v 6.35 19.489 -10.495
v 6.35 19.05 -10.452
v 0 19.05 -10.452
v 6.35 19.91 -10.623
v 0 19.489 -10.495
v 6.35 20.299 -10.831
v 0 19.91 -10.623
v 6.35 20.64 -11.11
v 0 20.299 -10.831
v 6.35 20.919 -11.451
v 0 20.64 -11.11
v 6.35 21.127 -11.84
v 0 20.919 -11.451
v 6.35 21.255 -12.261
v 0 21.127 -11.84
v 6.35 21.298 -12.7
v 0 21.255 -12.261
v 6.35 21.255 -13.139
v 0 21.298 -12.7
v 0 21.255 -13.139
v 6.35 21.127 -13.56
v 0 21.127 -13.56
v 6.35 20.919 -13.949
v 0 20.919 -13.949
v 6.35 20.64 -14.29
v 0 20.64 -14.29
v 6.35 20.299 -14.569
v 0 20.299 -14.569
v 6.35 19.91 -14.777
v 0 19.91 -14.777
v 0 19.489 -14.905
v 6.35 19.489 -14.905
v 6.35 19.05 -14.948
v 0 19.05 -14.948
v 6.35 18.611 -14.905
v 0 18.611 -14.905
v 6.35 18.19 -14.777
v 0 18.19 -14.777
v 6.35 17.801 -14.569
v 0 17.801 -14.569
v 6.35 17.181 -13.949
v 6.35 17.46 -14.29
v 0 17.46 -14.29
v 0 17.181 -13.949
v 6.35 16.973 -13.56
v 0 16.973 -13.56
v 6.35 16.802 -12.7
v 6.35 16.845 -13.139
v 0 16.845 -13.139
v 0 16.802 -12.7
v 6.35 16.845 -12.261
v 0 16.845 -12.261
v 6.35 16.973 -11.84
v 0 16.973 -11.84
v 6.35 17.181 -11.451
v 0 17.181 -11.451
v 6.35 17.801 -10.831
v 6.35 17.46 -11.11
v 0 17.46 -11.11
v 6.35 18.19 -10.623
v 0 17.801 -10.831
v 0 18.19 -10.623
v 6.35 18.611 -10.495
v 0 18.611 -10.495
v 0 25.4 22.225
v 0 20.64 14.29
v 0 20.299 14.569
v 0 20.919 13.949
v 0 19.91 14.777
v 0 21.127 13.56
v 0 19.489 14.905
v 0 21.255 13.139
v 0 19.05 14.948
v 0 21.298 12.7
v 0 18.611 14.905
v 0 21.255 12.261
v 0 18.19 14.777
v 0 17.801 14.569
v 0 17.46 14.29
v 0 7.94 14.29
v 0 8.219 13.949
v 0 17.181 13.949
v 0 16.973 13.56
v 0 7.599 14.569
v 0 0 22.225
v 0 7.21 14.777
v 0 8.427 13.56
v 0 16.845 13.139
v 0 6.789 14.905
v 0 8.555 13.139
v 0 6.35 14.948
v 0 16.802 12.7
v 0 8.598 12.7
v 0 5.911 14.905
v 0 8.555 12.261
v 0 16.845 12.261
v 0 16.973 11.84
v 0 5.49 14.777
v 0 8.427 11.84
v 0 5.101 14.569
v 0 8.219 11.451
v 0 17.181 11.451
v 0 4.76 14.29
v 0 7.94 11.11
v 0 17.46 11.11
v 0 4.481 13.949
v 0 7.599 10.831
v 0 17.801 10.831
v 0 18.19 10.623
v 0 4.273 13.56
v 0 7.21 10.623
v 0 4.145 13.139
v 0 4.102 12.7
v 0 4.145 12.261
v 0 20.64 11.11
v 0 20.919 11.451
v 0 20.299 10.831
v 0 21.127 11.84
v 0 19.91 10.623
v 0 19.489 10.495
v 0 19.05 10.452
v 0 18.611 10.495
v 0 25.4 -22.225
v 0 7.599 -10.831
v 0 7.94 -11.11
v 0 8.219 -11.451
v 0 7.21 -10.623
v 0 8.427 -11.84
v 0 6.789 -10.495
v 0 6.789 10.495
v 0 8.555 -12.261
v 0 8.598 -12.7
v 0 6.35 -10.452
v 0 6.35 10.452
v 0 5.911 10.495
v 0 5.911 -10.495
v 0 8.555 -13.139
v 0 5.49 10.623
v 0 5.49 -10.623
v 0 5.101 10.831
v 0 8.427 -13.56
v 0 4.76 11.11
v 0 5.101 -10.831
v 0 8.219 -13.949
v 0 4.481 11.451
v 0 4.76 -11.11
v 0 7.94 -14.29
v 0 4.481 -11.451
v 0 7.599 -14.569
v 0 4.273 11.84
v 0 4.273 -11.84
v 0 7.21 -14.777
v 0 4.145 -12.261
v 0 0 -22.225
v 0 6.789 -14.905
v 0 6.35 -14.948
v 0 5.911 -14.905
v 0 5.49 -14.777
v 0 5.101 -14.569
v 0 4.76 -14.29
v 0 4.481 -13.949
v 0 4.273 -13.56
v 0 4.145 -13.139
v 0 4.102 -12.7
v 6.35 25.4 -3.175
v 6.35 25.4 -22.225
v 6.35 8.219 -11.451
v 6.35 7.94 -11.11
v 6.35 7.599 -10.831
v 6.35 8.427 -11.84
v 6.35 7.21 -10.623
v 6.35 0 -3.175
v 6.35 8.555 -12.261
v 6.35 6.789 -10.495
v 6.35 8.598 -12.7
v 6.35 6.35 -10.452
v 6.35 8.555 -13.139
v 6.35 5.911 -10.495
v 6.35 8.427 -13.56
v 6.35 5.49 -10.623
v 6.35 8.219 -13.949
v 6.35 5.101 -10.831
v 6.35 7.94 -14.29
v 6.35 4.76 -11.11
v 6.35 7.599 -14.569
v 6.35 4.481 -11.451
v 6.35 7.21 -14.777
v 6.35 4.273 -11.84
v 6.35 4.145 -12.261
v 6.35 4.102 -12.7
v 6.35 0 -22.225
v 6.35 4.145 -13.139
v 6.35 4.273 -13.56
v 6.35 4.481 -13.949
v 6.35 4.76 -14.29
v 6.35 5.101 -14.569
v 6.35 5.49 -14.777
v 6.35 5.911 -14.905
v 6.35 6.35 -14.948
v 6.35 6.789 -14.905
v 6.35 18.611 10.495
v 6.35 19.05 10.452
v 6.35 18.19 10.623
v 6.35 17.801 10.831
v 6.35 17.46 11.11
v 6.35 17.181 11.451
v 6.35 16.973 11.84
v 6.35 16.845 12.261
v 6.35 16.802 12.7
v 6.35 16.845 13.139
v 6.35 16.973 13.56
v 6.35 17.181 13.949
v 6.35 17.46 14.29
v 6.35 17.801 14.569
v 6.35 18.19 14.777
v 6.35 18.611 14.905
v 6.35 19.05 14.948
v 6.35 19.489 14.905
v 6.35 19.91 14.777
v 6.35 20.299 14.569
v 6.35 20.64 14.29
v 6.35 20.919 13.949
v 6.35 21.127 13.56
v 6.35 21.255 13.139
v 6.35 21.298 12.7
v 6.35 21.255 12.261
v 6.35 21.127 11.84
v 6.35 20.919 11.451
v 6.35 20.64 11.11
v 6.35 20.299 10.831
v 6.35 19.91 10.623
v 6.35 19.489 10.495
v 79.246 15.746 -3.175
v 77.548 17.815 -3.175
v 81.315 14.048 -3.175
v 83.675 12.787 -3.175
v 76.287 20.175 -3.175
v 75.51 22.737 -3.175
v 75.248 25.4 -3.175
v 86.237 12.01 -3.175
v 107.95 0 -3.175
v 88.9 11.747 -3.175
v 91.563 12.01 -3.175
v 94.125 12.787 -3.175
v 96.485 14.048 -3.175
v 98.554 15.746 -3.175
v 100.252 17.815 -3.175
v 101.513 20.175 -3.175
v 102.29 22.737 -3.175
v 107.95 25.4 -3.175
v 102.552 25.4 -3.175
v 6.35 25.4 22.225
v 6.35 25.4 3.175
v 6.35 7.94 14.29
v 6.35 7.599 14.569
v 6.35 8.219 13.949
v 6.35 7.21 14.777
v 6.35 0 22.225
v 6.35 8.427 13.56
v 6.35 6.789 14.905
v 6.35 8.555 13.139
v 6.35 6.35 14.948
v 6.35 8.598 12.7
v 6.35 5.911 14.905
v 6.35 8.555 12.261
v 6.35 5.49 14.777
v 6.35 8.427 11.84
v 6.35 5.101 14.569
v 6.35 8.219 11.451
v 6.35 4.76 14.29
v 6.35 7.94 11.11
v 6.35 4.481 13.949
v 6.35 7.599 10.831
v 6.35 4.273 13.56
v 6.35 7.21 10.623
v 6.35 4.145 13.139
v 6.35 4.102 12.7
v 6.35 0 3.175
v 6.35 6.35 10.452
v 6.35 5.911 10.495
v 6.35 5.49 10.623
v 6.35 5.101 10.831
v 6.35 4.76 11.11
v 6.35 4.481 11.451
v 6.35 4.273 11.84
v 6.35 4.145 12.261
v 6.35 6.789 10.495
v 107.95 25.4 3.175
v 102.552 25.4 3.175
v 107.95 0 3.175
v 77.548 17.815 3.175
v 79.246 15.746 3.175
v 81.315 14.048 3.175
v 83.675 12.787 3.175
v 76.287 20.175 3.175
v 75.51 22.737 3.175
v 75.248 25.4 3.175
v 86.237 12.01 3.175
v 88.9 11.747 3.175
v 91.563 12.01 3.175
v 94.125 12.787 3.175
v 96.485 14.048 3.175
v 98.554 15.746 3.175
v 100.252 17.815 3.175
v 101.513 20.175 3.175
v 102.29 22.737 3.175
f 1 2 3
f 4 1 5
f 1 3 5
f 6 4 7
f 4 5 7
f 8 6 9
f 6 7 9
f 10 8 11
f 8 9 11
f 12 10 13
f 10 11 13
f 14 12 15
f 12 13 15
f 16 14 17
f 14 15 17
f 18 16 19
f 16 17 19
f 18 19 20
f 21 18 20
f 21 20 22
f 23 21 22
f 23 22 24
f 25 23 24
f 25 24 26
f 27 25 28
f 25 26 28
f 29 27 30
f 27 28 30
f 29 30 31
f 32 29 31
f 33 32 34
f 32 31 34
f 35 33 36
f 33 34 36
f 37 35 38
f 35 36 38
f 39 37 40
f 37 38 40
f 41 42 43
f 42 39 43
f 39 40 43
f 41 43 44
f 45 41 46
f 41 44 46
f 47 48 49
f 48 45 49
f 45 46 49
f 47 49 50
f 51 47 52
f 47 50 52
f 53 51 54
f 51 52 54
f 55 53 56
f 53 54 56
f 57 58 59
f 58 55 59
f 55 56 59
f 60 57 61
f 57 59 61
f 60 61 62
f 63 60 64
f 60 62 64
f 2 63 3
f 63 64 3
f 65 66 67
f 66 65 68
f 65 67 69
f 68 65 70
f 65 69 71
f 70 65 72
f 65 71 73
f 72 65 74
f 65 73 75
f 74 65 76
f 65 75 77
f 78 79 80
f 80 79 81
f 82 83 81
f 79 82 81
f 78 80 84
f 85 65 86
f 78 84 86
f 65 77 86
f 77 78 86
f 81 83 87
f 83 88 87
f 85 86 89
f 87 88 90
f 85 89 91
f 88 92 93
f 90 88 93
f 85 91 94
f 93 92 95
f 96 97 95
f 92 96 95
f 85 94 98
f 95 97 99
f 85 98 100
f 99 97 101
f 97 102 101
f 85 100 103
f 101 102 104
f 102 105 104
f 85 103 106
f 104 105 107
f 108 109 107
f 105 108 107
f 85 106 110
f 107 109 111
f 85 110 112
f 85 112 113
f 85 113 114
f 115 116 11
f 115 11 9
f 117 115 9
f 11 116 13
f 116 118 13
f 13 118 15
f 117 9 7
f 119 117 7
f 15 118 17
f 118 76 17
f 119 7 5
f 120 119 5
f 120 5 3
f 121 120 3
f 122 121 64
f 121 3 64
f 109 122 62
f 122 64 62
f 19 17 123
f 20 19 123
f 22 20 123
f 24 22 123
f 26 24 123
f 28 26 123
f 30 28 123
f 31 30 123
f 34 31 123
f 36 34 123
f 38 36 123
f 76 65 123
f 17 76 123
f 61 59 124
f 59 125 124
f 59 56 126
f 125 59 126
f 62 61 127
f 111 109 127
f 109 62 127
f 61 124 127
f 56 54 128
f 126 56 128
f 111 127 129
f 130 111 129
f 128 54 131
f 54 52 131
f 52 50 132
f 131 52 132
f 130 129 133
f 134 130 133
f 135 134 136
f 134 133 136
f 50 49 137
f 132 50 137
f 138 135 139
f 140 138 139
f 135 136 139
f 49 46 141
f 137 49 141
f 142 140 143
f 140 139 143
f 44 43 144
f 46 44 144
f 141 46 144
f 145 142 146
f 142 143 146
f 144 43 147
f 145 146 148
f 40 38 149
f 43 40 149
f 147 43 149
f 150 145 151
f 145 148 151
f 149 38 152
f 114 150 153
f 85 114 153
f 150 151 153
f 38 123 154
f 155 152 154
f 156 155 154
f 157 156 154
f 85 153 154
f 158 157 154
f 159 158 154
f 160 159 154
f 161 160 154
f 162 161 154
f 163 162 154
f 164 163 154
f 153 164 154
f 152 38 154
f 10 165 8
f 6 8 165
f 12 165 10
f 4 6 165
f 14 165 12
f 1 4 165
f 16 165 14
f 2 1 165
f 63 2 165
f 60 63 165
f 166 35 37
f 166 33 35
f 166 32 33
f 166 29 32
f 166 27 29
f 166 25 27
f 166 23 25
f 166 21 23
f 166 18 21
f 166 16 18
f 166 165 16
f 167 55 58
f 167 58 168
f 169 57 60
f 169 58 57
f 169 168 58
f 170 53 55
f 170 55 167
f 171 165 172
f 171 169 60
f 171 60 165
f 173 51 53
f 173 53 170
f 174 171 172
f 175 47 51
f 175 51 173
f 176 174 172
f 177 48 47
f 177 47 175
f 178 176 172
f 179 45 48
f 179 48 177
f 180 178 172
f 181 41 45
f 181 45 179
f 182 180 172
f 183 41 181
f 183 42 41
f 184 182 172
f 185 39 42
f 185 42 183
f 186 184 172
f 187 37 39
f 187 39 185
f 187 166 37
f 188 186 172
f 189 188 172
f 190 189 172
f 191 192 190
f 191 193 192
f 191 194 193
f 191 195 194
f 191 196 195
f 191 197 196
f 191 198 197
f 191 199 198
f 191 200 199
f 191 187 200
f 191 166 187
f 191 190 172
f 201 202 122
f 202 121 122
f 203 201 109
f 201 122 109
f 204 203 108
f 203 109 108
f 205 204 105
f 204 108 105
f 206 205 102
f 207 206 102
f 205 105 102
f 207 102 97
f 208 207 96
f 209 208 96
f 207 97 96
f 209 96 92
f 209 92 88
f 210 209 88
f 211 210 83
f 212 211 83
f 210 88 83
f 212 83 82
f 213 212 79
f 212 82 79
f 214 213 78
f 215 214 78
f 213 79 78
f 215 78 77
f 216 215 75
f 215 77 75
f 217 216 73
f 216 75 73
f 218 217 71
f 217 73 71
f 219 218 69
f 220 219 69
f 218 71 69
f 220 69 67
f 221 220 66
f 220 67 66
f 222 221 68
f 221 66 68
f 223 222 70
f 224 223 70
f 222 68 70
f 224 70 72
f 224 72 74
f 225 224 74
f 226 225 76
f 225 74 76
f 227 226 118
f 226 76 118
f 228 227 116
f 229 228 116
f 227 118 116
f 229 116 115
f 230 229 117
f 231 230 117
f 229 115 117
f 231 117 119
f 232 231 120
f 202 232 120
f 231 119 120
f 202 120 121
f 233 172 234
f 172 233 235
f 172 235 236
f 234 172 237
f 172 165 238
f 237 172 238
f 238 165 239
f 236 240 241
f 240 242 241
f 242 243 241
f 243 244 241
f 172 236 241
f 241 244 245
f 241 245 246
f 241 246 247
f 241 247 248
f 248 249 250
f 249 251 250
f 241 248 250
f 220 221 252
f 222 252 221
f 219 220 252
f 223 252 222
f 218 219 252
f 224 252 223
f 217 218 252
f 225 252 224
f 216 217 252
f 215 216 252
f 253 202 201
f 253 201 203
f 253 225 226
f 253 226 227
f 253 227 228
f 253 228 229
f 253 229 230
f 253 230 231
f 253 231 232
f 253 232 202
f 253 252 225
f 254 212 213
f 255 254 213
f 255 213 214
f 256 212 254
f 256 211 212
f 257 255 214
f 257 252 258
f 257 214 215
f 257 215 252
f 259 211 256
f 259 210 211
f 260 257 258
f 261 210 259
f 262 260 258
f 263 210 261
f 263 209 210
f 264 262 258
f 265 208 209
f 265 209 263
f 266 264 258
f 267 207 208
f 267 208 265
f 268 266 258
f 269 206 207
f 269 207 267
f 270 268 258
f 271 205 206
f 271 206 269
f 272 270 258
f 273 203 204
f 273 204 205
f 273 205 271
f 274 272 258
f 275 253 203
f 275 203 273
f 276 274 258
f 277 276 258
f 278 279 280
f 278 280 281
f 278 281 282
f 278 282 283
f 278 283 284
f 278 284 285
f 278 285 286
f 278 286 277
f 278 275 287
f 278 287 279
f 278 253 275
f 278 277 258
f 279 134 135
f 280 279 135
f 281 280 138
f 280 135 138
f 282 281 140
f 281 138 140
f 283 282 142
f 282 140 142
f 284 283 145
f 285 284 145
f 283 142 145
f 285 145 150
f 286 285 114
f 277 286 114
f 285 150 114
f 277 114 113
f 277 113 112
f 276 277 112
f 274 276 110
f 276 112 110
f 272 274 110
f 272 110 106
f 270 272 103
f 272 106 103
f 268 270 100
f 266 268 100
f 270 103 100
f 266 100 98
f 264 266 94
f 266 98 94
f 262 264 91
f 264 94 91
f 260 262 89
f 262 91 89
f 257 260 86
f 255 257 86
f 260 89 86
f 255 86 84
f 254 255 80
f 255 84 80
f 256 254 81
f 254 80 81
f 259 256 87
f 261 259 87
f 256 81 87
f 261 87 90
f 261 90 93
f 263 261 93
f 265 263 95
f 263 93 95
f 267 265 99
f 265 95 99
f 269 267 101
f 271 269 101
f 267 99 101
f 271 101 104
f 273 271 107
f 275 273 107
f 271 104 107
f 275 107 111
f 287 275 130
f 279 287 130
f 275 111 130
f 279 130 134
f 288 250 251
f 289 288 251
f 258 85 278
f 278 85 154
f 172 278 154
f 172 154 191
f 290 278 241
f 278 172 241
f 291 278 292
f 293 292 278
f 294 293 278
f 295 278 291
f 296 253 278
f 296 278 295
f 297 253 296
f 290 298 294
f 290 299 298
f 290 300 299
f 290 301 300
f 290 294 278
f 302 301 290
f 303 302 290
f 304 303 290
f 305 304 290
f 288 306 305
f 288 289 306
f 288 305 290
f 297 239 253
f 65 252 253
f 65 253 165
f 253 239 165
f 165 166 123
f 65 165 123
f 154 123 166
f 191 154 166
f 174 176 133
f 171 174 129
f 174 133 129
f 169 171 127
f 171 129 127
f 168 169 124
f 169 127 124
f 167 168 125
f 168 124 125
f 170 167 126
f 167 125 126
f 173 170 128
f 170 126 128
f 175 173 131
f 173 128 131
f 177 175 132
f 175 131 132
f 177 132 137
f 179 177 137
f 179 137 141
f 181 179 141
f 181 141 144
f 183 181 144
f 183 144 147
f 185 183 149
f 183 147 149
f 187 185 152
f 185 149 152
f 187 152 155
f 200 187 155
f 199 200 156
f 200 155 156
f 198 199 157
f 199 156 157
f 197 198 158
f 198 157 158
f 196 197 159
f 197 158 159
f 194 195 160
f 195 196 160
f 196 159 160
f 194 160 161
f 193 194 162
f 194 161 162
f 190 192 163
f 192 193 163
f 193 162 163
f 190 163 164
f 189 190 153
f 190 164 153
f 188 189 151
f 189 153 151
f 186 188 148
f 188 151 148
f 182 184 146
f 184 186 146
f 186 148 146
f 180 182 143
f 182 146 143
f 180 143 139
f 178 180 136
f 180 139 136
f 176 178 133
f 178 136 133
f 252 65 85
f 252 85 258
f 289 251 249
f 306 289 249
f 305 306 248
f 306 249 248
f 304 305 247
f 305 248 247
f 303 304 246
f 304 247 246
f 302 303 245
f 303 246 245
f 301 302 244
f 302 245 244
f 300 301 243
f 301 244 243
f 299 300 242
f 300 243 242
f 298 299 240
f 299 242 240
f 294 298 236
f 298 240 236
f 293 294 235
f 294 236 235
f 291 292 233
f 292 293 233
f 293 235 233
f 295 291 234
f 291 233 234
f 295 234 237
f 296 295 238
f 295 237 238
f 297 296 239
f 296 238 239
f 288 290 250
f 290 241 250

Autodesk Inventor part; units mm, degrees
ref_plane "YZ Plane" through (0, 0, 0) normal (1, 0, 0) x (0, 1, 0)
ref_plane "XZ Plane" through (0, 0, 0) normal (0, 1, 0) x (-1, 0, 0)
ref_plane "XY Plane" through (0, 0, 0) normal (0, 0, 1) x (1, 0, 0)
sketch "Sketch2" plane through (0, 0, 0) normal (0, 0, 1) x (1, 0, 0)
  line L0 (0, 0) -> (107.95, 0)
  line L1 (107.95, 0) -> (107.95, 25.4)
  line L2 (0, 25.4) -> (0, 0)
  arc A0 (75.2475, 25.4) -> (102.5525, 25.4) centre (88.9, 25.4) ccw
  line L3 (107.95, 25.4) -> (102.5525, 25.4)
  line L4 (75.2475, 25.4) -> (0, 25.4)
  dimension "d0" = 107.95
  dimension "d1" = 25.4
  dimension "d2" = 27.305
  dimension "d3" = 88.9
extrude "Extrusion1" add sketch "Sketch2" along normal mid plane 6.35
sketch "Sketch3" plane through (0, 0, 0) normal (0, 0, 1) x (1, 0, 0)
  line L0 (0, 0) -> (0, 25.4) projected
  line L1 (0, 25.4) -> (75.2475, 25.4) projected
  line L2 (107.95, 0) -> (0, 0) projected
  line L3 (0, 25.4) -> (6.35, 25.4)
  line L4 (6.35, 25.4) -> (6.35, 0)
  line L5 (6.35, 0) -> (0, 0)
  line L6 (0, 0) -> (0, 25.4)
  dimension "d17" = 6.35
extrude "Extrusion2" add sketch "Sketch3" along normal mid plane 44.45
sketch "Sketch4" plane through (6.35, 0, 3.175) normal (1, 0, 0) x (0, 0, -1)
  line L0 (-19.05, 0) -> (-19.05, 25.4) projected
  line L1 (-19.05, 25.4) -> (0, 25.4) projected
  line L2 (0, 0) -> (-19.05, 0) projected
  line L3 (0, 25.4) -> (0, 0) projected
  line L4 (-19.05, 25.4) -> (25.4, 25.4) construction
  line L5 (-9.525, 25.4) -> (-9.525, 0) construction
  point P0 (3.175, 0)
  point P1 (-9.525, 19.05)
  point P2 (-9.525, 6.35)
  dimension "d8" = 6.35
  dimension "d9" = 6.35
hole "Hole1" at (6.35, 19.05, 12.7) at (6.35, 6.35, 12.7) direction (-1, 0, 0) diameter 4.4958 end through all clearance for "Socket Head Cap Screw" size "#8" standard "Ansi Unified Screw Threads"
mirror "Mirror1" about plane through (0, 0, 0) normal (0, 0, 1) of "Hole1"
ref_plane "Work Plane1" through (0, 0, 0) normal (0, 0, 1) x (1, 0, 0)
equation "\"d0\" = supportLength"
equation "\"d1\" = supportHeight"
equation "\"d2\" = pipeDiameter"
equation "\"d3\" = distanceFromWallToPipeCenter"
equation "\"d4\" = supportWidth"
equation "\"d17\" = screwHoldDepth"
equation "\"d6\" = totalScrewHoldWidth"
equation "\"d8\" = screwPositionFromTop"
equation "\"d9\" = screwPositionFromTop"
equation "\"pipeDiameter\" = 27.305"
equation "\"distanceFromWallToPipeCenter\" = 88.9"
equation "\"supportLength\" = 107.95"
equation "\"supportHeight\" = 25.4"
equation "\"supportWidth\" = 6.35"
equation "\"screwHoldDepth\" = 6.35"
equation "\"screwHoldWidthExtension\" = 19.05"
equation "\"totalScrewHoldWidth\" = supportWidth + 2 * screwHoldWidthExtension"
equation "\"screwPositionFromTop\" = 6.35"
properties part number "irrigationPipeSupport"
